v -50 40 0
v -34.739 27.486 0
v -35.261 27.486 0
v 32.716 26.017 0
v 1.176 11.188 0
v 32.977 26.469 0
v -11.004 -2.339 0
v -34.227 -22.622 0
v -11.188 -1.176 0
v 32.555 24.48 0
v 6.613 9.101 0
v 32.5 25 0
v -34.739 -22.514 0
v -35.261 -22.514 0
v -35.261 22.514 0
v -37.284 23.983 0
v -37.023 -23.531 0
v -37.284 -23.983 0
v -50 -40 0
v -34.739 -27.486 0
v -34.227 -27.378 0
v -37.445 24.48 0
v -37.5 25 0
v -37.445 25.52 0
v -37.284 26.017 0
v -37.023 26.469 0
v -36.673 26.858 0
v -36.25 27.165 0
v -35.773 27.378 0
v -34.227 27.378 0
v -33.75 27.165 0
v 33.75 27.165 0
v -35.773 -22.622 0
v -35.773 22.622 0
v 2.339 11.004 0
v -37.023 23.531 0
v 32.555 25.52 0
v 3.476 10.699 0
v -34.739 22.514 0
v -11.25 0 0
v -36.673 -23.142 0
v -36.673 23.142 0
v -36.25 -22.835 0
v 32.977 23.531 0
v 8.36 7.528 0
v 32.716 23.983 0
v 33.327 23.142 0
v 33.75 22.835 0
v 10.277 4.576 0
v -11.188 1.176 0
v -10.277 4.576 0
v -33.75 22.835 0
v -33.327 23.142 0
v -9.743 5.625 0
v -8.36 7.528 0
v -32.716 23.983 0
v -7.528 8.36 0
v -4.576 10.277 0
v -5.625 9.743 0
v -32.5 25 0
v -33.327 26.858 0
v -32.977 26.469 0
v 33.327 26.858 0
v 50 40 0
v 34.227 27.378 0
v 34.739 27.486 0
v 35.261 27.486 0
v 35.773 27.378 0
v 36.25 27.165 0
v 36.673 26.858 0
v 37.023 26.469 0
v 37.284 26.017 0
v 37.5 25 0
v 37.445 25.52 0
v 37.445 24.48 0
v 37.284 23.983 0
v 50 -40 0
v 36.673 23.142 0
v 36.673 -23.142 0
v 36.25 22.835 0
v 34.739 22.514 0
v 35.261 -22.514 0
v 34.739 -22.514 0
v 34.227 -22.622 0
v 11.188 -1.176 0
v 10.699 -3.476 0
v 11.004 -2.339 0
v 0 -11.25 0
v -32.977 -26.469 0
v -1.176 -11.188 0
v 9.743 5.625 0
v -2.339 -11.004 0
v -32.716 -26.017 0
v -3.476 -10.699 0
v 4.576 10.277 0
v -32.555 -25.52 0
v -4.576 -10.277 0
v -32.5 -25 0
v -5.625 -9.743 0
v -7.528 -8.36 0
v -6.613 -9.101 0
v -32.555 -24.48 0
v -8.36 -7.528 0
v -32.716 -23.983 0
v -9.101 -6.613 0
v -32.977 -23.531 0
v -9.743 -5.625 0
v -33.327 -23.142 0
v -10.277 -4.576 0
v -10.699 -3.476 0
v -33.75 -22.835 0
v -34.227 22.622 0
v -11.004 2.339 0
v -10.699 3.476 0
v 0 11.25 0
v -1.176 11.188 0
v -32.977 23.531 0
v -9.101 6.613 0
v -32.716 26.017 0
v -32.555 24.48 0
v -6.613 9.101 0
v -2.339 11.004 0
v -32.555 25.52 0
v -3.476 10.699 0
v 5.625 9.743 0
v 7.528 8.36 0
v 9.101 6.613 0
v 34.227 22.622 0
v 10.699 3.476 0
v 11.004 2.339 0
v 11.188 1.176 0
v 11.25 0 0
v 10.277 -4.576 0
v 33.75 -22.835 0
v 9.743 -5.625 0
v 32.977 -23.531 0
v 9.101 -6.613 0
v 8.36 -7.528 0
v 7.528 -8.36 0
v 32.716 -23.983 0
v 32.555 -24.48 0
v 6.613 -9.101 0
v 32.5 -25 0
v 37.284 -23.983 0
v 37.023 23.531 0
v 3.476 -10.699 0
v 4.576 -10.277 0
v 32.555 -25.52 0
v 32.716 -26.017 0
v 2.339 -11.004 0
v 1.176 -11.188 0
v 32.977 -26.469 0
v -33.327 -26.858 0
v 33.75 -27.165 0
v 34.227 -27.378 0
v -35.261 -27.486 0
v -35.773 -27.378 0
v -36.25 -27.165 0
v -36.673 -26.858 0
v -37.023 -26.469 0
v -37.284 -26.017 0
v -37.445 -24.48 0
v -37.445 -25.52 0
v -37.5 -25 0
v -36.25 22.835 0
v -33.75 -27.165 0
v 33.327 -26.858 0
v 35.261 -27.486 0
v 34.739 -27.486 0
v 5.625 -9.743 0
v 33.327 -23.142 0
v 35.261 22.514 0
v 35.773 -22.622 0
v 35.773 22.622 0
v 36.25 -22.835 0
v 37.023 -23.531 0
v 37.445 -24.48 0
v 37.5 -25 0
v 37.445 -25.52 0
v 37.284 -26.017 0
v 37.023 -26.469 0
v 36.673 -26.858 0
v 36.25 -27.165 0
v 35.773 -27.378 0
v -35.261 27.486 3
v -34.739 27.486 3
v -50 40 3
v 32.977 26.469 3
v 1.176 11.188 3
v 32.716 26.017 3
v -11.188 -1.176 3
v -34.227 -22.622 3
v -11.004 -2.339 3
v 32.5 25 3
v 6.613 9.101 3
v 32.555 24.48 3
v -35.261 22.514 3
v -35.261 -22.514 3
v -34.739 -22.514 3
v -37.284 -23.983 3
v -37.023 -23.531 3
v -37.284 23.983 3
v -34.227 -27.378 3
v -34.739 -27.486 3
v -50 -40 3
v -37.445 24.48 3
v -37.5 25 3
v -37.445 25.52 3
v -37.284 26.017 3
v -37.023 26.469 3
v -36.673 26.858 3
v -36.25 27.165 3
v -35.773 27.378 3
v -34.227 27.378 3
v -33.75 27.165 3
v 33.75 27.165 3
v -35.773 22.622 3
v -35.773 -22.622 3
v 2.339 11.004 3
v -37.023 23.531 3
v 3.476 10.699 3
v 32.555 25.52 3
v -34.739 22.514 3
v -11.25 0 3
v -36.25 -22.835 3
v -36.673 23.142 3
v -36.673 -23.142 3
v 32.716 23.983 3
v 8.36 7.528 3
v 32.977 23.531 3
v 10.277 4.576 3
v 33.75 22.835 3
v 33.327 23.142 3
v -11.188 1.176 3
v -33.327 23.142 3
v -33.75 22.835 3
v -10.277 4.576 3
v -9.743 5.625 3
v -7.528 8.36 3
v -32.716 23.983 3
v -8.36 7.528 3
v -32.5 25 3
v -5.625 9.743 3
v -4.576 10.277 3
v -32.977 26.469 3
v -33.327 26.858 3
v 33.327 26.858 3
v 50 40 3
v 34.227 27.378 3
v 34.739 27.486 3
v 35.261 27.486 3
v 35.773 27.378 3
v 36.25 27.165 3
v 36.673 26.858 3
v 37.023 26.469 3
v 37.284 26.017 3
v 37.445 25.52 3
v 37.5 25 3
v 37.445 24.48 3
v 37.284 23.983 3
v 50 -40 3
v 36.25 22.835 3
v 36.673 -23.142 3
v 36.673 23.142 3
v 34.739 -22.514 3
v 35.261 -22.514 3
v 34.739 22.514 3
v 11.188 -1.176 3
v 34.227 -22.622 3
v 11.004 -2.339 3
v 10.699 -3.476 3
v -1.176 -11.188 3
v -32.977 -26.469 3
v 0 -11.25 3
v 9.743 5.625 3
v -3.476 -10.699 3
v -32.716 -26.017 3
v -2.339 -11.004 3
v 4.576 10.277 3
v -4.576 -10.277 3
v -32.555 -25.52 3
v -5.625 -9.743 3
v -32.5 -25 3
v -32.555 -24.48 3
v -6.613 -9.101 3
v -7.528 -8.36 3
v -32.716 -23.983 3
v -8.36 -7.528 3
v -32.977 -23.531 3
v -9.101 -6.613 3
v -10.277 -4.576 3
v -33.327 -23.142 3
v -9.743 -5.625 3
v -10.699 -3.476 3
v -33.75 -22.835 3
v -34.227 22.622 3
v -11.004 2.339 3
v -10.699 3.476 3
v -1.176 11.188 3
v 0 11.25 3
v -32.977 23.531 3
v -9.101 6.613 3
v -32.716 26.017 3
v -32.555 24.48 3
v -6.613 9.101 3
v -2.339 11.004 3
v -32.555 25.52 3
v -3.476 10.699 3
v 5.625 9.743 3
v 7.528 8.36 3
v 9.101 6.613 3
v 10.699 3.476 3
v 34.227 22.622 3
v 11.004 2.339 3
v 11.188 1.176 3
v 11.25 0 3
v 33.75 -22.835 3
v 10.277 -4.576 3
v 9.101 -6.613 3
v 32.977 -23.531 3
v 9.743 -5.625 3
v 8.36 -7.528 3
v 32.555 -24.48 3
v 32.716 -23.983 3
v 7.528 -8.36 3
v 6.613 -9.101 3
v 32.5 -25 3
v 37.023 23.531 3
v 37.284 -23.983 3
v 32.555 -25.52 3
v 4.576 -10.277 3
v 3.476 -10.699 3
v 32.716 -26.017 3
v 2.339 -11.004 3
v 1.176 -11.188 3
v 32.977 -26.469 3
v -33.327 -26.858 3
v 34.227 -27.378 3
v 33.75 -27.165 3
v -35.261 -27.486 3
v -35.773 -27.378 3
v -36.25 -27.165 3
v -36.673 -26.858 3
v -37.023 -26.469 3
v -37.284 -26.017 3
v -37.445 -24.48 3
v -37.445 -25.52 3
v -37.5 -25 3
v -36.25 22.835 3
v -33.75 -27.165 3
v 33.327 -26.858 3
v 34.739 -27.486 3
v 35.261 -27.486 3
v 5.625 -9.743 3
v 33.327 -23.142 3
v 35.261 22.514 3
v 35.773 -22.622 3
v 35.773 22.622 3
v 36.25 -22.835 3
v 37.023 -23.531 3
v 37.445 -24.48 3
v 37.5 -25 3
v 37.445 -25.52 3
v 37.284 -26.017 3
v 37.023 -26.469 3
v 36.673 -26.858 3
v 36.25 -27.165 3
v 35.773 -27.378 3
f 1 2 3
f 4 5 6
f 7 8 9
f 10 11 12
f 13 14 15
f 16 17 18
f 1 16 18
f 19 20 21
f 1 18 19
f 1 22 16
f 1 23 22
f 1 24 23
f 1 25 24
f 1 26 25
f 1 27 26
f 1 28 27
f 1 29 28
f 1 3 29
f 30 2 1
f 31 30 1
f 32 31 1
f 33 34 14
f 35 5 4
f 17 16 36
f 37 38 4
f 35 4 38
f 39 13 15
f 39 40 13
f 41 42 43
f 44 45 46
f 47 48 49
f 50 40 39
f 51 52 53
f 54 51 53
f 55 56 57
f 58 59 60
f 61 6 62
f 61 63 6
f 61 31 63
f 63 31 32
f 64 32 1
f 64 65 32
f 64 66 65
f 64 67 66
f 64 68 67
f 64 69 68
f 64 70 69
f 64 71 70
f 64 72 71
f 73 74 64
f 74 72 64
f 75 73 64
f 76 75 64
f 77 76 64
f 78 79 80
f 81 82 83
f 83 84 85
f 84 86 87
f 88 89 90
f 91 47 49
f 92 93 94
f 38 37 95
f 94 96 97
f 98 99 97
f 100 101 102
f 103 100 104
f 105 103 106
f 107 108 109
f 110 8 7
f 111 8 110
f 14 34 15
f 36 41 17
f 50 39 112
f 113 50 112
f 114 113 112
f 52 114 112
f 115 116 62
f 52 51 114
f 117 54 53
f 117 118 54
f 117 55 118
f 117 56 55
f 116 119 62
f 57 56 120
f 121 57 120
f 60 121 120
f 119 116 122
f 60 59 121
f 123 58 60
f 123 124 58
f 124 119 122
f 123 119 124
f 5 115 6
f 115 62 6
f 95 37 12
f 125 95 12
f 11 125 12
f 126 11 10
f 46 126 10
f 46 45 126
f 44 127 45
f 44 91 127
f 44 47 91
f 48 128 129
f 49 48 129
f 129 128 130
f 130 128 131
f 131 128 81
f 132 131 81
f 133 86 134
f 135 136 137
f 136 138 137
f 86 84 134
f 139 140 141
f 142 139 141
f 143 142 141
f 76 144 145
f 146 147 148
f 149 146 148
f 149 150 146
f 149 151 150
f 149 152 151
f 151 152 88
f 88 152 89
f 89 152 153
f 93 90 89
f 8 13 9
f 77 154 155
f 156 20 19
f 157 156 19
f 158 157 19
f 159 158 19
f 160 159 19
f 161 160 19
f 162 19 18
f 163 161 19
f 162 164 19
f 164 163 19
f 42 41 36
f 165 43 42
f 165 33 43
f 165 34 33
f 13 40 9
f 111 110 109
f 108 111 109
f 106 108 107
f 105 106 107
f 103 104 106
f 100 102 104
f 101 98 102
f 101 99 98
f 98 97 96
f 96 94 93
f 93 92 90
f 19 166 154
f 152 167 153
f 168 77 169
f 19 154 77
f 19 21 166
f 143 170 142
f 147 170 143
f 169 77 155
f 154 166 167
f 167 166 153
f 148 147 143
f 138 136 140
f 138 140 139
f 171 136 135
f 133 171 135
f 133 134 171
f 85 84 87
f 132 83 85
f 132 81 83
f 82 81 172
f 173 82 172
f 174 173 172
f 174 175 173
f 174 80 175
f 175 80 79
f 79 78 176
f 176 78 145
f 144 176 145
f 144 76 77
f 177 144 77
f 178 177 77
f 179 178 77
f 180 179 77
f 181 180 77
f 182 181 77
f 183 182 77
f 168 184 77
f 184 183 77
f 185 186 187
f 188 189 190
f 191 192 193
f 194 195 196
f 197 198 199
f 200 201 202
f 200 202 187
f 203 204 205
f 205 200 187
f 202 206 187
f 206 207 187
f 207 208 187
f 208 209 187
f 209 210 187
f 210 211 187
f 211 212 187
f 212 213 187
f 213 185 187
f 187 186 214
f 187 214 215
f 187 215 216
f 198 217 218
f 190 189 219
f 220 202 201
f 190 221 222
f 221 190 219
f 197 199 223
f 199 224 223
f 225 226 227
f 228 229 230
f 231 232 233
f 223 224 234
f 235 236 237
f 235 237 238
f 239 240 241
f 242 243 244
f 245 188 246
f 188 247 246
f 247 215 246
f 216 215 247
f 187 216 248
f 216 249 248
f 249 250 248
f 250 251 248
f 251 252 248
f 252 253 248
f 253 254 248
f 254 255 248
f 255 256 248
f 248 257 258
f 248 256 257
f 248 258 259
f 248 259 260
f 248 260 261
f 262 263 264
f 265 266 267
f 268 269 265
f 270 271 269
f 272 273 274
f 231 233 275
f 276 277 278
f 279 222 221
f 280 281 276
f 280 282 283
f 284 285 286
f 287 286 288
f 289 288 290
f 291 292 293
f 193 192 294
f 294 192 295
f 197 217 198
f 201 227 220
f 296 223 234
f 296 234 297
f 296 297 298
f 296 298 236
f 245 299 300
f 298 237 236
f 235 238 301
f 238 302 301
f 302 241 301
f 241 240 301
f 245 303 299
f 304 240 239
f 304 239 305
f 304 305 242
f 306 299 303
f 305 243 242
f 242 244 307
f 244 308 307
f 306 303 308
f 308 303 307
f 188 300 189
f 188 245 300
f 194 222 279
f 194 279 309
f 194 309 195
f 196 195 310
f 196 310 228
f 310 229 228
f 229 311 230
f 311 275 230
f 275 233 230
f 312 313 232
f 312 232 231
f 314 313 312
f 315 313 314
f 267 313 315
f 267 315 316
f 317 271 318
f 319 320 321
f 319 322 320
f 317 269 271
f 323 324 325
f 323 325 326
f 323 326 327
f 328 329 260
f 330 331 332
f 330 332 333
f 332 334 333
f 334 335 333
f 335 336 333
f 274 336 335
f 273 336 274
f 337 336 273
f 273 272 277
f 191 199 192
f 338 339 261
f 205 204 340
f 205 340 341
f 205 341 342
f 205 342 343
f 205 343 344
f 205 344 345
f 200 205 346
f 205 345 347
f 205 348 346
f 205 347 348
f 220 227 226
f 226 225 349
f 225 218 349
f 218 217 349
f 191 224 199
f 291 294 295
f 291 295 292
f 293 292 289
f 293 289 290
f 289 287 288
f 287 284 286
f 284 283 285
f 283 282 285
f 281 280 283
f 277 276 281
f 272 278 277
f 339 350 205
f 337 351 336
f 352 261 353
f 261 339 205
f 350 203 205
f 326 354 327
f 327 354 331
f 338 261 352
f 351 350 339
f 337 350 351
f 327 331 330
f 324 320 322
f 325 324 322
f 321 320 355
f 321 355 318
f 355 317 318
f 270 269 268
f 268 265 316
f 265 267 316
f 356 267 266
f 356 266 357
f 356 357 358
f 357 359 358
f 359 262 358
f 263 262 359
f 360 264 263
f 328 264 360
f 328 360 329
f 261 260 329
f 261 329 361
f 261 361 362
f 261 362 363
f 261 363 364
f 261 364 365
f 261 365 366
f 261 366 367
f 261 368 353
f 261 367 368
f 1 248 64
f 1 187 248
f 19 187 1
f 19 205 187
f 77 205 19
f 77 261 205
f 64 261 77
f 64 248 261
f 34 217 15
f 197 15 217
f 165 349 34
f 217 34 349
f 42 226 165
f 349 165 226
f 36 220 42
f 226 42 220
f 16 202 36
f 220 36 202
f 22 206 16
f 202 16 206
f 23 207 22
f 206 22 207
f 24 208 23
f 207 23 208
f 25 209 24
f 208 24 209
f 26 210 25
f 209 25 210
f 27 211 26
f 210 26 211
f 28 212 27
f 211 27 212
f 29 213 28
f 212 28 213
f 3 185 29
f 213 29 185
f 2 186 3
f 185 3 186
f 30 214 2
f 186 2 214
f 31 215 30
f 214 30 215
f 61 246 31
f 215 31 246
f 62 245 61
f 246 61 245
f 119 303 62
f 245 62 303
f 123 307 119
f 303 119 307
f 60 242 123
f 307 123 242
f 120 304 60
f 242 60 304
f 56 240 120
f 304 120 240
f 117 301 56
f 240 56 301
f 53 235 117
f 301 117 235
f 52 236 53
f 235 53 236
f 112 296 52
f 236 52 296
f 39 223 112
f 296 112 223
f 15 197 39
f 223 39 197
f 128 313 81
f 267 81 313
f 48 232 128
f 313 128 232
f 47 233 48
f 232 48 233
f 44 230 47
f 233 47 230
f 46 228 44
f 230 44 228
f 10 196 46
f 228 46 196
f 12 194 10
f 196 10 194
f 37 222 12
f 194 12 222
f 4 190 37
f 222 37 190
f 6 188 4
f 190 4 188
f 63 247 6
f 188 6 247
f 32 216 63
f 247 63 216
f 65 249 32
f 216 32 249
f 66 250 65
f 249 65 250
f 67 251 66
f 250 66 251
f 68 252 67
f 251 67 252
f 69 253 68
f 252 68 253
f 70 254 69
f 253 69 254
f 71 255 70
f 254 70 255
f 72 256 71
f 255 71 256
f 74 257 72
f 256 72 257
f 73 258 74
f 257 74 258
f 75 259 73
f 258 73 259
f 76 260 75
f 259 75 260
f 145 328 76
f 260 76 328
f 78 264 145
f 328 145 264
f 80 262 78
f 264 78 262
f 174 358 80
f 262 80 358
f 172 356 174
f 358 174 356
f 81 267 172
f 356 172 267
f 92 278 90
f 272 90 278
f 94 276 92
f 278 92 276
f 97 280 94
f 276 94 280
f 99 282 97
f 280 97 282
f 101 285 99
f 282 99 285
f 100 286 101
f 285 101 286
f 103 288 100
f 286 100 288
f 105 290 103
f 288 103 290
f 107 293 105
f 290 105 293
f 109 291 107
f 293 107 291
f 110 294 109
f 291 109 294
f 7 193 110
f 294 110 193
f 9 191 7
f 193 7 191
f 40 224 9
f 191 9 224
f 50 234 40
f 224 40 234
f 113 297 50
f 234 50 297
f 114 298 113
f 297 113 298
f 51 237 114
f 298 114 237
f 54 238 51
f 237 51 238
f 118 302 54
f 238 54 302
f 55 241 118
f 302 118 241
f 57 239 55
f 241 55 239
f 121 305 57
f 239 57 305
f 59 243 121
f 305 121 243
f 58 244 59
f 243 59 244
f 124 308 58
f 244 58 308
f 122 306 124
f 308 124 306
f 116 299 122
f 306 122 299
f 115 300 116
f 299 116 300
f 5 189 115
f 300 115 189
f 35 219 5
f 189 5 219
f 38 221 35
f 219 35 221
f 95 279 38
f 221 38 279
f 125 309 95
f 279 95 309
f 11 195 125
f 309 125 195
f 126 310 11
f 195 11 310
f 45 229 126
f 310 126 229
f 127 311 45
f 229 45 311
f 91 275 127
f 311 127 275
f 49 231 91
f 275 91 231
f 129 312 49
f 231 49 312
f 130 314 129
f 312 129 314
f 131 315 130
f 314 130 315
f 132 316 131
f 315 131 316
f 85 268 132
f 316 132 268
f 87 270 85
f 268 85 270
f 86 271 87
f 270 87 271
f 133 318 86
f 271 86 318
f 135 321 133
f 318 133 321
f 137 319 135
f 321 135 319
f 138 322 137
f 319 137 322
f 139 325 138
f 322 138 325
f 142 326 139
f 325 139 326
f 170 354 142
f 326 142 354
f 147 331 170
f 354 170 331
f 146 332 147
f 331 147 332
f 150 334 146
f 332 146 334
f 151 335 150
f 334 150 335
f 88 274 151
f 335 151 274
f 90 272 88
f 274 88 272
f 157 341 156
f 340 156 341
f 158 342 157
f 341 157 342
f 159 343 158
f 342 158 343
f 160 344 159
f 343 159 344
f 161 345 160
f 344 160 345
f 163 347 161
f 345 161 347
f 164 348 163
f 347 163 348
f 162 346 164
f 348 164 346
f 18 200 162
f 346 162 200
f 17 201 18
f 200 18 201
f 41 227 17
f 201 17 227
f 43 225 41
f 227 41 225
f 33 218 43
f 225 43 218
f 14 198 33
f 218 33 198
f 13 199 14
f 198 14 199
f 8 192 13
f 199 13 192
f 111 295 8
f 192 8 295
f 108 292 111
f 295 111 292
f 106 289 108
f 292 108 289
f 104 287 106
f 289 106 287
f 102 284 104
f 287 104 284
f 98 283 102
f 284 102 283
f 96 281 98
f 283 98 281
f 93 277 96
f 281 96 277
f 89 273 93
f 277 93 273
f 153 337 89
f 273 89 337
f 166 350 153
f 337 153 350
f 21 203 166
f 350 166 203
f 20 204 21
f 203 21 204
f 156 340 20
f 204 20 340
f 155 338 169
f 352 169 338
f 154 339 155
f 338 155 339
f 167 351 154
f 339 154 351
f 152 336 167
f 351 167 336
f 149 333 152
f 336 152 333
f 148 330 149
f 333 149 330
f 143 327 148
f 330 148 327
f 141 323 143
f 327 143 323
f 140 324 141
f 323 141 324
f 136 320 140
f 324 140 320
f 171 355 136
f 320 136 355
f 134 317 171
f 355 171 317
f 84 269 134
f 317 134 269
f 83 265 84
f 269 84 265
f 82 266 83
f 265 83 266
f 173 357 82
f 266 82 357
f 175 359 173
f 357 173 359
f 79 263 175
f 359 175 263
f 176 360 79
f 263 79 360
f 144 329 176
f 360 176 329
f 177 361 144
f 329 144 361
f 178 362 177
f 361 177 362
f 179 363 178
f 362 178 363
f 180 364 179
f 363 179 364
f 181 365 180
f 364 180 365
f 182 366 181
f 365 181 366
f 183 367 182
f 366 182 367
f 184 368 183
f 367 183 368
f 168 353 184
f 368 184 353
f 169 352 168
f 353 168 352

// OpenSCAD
plate_w = 100;
plate_h = 80;
plate_t = 3;

linear_extrude(height=plate_t)
  difference(){
    square([plate_w, plate_h], center=true);
    circle(d=22.5,$fn=60);
    for (x=[-35,35]) for (y=[-25,25]) translate([x,y]) circle(d=5.0,$fn=30);
  }
